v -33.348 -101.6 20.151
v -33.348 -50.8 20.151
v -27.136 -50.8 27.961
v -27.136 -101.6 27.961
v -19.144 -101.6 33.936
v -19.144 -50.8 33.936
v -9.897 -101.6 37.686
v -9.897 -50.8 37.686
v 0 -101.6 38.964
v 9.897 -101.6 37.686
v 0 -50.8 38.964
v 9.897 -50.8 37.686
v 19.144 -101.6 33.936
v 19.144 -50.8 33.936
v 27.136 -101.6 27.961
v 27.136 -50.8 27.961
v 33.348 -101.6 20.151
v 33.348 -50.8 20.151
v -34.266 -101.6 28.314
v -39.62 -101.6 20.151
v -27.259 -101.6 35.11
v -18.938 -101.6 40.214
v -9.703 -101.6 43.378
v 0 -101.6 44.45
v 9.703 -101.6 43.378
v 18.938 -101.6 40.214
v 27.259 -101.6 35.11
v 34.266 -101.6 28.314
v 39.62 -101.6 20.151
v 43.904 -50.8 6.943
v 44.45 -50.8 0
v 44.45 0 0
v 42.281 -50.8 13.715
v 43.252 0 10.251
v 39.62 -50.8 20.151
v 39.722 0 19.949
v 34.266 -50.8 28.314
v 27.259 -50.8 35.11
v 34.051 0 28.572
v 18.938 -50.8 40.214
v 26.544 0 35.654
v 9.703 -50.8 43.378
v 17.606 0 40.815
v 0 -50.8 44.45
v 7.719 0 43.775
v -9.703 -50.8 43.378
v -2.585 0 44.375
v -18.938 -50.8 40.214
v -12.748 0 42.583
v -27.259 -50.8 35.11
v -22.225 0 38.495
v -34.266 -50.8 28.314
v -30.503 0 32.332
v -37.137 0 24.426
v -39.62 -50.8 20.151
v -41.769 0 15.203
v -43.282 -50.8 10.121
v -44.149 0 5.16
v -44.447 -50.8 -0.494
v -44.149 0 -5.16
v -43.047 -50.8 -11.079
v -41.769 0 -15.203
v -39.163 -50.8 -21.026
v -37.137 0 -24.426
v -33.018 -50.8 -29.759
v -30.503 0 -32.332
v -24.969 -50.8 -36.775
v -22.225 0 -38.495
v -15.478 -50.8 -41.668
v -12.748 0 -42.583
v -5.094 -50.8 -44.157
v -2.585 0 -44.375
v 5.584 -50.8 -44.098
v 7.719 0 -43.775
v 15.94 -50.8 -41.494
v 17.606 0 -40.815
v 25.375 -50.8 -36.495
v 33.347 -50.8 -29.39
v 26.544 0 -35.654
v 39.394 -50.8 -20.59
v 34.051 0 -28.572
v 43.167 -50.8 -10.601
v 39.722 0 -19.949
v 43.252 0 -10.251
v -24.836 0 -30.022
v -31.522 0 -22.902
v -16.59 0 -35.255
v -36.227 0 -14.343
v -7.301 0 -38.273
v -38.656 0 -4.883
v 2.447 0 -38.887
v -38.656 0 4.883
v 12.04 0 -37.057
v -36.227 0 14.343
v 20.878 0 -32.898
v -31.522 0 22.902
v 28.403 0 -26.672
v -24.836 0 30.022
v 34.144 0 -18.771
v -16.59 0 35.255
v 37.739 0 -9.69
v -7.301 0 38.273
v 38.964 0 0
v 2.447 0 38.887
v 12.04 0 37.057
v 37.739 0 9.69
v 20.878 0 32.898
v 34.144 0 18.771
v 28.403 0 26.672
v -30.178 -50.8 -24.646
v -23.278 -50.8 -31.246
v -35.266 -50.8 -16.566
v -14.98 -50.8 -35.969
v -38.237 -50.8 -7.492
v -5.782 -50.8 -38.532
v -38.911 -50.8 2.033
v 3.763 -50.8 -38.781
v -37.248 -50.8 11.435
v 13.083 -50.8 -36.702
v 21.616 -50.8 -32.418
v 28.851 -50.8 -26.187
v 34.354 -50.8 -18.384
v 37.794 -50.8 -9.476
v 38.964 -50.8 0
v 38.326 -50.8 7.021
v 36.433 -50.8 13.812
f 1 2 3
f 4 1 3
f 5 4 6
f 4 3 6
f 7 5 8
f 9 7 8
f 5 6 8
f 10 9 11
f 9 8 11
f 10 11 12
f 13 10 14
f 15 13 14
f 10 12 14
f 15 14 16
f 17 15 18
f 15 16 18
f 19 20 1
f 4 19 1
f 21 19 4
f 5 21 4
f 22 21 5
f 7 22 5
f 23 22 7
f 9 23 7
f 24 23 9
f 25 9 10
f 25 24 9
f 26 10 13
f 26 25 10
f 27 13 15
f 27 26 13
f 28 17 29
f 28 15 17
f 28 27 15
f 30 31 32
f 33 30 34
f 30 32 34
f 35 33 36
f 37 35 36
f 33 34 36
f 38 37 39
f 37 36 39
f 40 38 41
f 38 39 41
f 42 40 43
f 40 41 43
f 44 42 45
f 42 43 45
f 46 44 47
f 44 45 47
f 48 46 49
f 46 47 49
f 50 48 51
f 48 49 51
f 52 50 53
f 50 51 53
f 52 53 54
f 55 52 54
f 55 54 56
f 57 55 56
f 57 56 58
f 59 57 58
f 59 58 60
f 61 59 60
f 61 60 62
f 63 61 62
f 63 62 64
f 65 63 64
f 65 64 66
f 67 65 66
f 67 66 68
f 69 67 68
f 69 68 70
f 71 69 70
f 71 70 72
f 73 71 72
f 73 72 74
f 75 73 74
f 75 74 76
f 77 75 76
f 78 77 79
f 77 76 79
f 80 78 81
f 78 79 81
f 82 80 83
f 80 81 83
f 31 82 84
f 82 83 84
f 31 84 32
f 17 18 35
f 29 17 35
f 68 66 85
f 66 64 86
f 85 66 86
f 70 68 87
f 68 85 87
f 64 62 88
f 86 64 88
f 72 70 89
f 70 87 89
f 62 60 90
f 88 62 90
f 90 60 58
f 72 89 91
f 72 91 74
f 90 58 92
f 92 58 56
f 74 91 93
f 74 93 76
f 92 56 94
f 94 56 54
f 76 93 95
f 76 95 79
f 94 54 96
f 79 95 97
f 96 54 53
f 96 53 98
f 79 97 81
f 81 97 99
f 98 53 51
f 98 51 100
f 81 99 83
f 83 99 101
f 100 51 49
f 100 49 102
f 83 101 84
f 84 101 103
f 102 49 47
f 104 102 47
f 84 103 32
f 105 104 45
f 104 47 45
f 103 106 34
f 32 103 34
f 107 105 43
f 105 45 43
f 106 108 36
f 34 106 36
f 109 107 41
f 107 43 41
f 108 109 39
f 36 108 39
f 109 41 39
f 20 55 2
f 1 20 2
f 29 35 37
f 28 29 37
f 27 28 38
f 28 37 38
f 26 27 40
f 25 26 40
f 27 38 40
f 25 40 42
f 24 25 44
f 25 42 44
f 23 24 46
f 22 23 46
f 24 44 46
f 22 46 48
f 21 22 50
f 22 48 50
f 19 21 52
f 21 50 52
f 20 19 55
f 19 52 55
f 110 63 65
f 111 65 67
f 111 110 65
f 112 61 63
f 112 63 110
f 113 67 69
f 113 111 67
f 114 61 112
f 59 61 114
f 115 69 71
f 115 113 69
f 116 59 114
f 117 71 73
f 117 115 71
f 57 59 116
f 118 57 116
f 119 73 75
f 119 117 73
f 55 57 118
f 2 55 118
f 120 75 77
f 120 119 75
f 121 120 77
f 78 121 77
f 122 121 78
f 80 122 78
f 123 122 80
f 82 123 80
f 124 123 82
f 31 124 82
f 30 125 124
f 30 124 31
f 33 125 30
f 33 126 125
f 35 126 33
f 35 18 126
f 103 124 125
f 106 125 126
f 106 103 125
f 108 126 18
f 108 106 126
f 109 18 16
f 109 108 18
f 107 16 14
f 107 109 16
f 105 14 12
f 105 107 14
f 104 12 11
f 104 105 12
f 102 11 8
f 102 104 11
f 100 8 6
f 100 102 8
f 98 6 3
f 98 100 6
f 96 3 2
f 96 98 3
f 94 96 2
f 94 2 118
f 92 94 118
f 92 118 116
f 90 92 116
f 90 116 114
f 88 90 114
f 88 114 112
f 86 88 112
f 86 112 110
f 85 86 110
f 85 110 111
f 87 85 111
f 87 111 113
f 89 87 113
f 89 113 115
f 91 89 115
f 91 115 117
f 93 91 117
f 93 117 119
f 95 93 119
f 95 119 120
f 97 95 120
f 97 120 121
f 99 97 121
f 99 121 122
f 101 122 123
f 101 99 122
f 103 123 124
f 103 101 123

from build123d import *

# Parameters (mm, degrees)
F0_R     = 44.45
F0_R_2   = 38.9636
F1_DEPTH = 50.8
F3_DEPTH = 50.8


with BuildPart() as f1:
    # F0 (on Front) → F1 (new body)
    with BuildSketch(Plane.XZ):
        Circle(F0_R)
        Circle(F0_R_2, mode=Mode.SUBTRACT)
    extrude(amount=F1_DEPTH)

    # F2 (on face) → F3 (join)
    with BuildSketch(Plane.XZ.offset(50.8)):
        with BuildLine():
            Line((33.3481304372, 20.1510377228), (39.6199214877, 20.1510377228))
            ThreePointArc((39.6199214877, 20.1510377228), (0, 44.45), (-39.6199214877, 20.1510377228))
            Line((-39.6199214877, 20.1510377228), (-33.3481304372, 20.1510377228))
            ThreePointArc((-33.3481304372, 20.1510377228), (0, 38.9636), (33.3481304372, 20.1510377228))
        make_face()
    extrude(amount=F3_DEPTH)


solid = f1.part
